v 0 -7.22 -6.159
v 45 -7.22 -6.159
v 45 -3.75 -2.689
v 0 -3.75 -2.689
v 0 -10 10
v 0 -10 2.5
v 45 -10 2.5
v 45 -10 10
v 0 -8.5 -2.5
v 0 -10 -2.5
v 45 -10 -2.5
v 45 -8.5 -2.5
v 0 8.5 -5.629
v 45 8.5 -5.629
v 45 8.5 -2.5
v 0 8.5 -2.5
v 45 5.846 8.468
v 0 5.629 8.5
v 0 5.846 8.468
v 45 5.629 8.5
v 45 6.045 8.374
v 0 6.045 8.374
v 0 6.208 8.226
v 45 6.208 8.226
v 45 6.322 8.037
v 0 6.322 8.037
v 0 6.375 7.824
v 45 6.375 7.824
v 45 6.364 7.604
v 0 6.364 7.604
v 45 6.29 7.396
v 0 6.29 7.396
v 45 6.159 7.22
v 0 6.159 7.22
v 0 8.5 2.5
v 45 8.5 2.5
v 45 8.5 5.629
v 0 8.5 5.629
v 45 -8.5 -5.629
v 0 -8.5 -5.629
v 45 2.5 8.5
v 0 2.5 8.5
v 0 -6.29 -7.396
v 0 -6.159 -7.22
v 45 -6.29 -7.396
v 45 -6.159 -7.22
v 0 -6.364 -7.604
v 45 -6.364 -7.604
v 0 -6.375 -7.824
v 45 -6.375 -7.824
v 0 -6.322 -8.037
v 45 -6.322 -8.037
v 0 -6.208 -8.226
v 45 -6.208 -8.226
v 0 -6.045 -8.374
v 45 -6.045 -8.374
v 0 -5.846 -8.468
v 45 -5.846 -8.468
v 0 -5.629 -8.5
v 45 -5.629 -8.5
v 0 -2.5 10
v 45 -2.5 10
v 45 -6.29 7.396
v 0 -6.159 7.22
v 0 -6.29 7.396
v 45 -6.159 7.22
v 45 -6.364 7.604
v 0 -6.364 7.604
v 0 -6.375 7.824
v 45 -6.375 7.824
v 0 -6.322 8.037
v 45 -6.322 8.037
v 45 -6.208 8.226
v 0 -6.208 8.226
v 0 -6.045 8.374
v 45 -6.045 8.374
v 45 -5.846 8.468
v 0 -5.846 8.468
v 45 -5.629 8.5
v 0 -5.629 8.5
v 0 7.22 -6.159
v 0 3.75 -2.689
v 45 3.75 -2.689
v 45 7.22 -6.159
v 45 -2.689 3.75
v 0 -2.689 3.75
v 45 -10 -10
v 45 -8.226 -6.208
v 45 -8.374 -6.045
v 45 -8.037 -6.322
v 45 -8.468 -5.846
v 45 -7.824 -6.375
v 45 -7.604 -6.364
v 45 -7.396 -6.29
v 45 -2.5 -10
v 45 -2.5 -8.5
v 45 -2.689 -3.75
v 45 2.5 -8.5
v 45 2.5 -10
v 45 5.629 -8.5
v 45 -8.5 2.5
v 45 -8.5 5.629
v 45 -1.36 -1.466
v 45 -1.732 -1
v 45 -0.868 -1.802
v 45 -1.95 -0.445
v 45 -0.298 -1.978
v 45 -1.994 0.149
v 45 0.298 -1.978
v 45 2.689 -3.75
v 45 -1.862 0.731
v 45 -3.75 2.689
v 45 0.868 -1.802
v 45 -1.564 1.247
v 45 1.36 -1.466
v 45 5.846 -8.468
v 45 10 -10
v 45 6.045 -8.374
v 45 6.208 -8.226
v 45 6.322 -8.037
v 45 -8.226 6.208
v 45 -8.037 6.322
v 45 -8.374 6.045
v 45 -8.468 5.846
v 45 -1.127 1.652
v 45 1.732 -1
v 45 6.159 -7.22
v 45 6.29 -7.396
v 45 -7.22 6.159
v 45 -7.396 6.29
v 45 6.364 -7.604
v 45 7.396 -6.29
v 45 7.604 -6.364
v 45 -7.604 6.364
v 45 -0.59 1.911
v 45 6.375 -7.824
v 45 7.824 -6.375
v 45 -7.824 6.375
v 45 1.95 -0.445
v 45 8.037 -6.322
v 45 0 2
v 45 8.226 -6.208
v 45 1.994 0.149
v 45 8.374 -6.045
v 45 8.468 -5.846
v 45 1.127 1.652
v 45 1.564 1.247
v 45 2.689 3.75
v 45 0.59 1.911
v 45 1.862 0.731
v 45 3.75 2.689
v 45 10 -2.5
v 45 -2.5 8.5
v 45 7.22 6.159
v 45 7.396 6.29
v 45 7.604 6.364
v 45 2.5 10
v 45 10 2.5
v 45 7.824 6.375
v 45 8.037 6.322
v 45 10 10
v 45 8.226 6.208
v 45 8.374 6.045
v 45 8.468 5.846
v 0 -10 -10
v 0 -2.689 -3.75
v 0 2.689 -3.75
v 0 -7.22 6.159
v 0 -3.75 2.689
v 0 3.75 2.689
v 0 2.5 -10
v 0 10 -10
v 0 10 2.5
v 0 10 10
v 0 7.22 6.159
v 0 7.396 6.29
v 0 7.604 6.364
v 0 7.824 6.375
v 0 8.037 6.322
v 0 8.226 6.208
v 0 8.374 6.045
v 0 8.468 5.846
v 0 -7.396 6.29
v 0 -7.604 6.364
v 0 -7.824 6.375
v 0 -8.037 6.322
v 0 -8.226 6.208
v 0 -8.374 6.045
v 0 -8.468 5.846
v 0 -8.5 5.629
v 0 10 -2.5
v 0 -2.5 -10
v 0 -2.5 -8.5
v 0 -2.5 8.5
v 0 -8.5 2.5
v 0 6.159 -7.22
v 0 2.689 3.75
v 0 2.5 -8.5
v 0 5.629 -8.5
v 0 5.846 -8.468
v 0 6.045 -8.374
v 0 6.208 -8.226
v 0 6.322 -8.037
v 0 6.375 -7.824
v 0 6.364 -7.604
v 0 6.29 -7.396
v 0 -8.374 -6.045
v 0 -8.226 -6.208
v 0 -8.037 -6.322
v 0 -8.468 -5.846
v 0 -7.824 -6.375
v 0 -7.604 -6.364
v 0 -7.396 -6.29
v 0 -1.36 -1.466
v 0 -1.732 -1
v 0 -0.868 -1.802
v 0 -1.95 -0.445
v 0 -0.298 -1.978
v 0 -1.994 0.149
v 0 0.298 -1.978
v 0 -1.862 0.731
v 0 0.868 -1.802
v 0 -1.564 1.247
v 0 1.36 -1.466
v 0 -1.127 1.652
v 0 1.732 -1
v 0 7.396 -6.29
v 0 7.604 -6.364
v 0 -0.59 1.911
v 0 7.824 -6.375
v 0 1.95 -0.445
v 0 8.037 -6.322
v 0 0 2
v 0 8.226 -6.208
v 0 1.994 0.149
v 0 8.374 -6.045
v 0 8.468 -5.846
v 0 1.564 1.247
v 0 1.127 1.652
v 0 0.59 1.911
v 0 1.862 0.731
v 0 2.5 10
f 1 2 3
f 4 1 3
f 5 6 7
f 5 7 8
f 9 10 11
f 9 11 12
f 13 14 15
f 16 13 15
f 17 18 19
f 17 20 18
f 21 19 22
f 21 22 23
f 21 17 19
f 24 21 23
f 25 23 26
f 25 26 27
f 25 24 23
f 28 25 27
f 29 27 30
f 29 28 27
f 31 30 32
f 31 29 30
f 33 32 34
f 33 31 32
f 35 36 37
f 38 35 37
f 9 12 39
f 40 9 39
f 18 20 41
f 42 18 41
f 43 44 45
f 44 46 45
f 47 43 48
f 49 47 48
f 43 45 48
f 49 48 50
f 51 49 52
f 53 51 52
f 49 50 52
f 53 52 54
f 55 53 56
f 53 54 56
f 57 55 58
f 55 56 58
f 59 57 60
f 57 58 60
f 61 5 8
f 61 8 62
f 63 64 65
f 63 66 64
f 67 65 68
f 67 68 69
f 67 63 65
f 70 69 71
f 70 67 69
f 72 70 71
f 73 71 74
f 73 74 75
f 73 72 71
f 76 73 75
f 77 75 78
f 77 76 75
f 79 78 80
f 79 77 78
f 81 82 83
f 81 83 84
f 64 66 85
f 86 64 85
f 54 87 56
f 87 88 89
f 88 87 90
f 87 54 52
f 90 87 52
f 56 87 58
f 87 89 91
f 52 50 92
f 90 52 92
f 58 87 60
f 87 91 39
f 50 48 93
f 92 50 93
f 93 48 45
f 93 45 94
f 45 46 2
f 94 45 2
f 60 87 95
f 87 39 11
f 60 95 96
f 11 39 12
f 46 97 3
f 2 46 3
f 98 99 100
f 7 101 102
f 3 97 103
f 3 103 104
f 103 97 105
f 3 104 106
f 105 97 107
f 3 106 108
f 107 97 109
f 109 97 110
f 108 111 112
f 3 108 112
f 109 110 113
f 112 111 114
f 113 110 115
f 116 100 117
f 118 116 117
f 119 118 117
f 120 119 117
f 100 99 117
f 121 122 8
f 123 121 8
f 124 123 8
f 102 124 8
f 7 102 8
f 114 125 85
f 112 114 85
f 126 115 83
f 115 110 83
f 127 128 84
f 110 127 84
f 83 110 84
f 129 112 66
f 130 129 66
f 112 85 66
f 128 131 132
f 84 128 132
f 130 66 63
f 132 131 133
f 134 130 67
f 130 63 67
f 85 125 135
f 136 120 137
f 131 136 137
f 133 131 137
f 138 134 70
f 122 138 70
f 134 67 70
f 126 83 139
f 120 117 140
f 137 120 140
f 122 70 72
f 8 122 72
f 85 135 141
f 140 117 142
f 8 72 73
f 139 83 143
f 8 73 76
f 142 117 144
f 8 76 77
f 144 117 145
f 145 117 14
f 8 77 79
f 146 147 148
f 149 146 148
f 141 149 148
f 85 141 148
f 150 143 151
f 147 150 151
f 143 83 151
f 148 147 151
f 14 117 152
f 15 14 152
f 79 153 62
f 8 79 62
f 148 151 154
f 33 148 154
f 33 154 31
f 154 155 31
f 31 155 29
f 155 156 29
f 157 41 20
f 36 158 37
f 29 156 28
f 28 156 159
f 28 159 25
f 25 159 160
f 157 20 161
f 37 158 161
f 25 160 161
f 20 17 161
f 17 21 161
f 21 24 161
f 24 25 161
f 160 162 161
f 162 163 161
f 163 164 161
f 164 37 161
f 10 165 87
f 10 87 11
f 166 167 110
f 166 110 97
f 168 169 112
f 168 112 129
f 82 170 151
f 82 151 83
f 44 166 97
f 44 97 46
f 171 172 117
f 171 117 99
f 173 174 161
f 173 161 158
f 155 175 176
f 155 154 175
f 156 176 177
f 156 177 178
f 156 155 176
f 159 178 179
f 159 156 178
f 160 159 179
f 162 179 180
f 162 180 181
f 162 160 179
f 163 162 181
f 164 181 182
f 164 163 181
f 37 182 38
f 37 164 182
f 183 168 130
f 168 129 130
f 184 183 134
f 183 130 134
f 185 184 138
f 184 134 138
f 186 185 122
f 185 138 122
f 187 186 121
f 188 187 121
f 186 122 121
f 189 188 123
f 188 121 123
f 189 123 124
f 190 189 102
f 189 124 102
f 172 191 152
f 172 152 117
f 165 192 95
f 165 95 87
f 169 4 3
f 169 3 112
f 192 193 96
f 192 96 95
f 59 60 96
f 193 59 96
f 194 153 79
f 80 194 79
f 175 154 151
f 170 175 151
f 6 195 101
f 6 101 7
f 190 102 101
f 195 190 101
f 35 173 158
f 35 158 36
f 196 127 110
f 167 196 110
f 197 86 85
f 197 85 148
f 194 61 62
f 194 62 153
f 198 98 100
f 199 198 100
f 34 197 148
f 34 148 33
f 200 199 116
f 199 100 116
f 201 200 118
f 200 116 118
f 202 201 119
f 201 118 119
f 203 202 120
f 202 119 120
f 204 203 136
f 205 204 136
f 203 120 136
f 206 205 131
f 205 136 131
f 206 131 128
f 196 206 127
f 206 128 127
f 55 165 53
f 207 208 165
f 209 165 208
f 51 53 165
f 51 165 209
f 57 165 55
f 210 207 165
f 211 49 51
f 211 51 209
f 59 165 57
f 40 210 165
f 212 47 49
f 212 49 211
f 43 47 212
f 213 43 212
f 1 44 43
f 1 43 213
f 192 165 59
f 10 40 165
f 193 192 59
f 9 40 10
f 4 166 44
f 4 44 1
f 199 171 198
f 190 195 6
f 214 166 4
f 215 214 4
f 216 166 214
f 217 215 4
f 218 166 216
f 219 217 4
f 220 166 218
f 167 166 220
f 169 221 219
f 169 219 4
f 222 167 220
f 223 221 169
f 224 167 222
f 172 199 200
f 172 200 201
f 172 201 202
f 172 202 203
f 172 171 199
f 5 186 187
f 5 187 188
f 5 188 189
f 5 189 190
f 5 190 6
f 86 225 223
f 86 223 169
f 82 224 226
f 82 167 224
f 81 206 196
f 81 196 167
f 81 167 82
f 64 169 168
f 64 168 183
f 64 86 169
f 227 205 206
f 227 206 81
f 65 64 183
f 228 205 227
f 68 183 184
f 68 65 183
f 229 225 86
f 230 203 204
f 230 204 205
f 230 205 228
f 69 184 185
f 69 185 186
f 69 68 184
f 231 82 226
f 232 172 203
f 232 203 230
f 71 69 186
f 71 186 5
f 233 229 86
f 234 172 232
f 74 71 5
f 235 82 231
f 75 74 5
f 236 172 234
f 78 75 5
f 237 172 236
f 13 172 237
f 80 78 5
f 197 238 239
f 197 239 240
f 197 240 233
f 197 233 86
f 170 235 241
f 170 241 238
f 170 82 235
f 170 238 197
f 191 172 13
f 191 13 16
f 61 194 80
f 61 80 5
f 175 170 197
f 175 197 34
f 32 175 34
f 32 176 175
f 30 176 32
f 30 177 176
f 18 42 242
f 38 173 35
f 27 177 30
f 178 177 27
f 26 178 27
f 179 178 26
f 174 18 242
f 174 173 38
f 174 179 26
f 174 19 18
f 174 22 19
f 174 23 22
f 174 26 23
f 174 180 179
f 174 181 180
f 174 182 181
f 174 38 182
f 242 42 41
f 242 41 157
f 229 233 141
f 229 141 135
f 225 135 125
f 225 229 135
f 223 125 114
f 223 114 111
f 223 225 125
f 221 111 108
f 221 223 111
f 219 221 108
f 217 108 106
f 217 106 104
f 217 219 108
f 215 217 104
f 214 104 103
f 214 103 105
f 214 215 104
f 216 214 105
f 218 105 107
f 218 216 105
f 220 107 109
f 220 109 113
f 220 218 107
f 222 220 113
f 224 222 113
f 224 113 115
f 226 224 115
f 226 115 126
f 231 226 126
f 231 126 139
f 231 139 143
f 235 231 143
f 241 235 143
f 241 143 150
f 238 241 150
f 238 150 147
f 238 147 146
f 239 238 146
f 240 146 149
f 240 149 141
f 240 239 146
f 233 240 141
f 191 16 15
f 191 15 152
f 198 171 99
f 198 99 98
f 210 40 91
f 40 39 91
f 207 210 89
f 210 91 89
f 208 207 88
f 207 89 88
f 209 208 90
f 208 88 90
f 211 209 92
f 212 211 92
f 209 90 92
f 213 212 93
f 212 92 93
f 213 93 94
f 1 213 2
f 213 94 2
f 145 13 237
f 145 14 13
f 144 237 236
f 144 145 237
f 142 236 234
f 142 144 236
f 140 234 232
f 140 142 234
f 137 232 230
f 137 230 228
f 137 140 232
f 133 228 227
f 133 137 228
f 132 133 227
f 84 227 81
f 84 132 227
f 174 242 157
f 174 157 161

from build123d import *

# Parameters (mm, degrees)
ESQUISSE1_R        = 2
BOSS_EXTRU_1_DEPTH = 45
CONG_1_R           = 0.75


with BuildPart() as part:
    # Esquisse1 → Boss.-Extru.1 (new body)
    with BuildSketch(Plane(origin=(0, 0, 0), x_dir=(0, 0, -1), z_dir=(1, 0, 0))):
        Polygon((2.5, 10), (10, 10), (10, 2.5), (8.5, 2.5), (8.5, 7.439339828), (3.75, 2.689339828), (3.75, -2.689339828), (8.5, -7.439339828), (8.5, -2.5), (10, -2.5), (10, -10), (2.5, -10), (2.5, -8.5), (7.439339828, -8.5), (2.689339828, -3.75), (-2.689339828, -3.75), (-7.439339828, -8.5), (-2.5, -8.5), (-2.5, -10), (-10, -10), (-10, -2.5), (-8.5, -2.5), (-8.5, -7.439339828), (-3.75, -2.689339828), (-3.75, 2.689339828), (-8.5, 7.439339828), (-8.5, 2.5), (-10, 2.5), (-10, 10), (-2.5, 10), (-2.5, 8.5), (-7.439339828, 8.5), (-2.689339828, 3.75), (2.689339828, 3.75), (7.439339828, 8.5), (2.5, 8.5), align=None)
        with Locations(Location((0, 0, 0), (0, 0, 180))):
            Circle(ESQUISSE1_R, mode=Mode.SUBTRACT)
    extrude(amount=BOSS_EXTRU_1_DEPTH)

    # Congé1
    cong_1_edges = [part.edges().sort_by_distance(p)[0] for p in [
        (22.5, 7.439339828, -8.5),
        (22.5, -7.439339828, -8.5),
        (22.5, -8.5, -7.439339828),
        (22.5, -8.5, 7.439339828),
        (22.5, -7.439339828, 8.5),
        (22.5, 7.439339828, 8.5),
        (22.5, 8.5, 7.439339828),
        (22.5, 8.5, -7.439339828),
    ]]
    fillet(cong_1_edges, radius=CONG_1_R)


solid = part.part
